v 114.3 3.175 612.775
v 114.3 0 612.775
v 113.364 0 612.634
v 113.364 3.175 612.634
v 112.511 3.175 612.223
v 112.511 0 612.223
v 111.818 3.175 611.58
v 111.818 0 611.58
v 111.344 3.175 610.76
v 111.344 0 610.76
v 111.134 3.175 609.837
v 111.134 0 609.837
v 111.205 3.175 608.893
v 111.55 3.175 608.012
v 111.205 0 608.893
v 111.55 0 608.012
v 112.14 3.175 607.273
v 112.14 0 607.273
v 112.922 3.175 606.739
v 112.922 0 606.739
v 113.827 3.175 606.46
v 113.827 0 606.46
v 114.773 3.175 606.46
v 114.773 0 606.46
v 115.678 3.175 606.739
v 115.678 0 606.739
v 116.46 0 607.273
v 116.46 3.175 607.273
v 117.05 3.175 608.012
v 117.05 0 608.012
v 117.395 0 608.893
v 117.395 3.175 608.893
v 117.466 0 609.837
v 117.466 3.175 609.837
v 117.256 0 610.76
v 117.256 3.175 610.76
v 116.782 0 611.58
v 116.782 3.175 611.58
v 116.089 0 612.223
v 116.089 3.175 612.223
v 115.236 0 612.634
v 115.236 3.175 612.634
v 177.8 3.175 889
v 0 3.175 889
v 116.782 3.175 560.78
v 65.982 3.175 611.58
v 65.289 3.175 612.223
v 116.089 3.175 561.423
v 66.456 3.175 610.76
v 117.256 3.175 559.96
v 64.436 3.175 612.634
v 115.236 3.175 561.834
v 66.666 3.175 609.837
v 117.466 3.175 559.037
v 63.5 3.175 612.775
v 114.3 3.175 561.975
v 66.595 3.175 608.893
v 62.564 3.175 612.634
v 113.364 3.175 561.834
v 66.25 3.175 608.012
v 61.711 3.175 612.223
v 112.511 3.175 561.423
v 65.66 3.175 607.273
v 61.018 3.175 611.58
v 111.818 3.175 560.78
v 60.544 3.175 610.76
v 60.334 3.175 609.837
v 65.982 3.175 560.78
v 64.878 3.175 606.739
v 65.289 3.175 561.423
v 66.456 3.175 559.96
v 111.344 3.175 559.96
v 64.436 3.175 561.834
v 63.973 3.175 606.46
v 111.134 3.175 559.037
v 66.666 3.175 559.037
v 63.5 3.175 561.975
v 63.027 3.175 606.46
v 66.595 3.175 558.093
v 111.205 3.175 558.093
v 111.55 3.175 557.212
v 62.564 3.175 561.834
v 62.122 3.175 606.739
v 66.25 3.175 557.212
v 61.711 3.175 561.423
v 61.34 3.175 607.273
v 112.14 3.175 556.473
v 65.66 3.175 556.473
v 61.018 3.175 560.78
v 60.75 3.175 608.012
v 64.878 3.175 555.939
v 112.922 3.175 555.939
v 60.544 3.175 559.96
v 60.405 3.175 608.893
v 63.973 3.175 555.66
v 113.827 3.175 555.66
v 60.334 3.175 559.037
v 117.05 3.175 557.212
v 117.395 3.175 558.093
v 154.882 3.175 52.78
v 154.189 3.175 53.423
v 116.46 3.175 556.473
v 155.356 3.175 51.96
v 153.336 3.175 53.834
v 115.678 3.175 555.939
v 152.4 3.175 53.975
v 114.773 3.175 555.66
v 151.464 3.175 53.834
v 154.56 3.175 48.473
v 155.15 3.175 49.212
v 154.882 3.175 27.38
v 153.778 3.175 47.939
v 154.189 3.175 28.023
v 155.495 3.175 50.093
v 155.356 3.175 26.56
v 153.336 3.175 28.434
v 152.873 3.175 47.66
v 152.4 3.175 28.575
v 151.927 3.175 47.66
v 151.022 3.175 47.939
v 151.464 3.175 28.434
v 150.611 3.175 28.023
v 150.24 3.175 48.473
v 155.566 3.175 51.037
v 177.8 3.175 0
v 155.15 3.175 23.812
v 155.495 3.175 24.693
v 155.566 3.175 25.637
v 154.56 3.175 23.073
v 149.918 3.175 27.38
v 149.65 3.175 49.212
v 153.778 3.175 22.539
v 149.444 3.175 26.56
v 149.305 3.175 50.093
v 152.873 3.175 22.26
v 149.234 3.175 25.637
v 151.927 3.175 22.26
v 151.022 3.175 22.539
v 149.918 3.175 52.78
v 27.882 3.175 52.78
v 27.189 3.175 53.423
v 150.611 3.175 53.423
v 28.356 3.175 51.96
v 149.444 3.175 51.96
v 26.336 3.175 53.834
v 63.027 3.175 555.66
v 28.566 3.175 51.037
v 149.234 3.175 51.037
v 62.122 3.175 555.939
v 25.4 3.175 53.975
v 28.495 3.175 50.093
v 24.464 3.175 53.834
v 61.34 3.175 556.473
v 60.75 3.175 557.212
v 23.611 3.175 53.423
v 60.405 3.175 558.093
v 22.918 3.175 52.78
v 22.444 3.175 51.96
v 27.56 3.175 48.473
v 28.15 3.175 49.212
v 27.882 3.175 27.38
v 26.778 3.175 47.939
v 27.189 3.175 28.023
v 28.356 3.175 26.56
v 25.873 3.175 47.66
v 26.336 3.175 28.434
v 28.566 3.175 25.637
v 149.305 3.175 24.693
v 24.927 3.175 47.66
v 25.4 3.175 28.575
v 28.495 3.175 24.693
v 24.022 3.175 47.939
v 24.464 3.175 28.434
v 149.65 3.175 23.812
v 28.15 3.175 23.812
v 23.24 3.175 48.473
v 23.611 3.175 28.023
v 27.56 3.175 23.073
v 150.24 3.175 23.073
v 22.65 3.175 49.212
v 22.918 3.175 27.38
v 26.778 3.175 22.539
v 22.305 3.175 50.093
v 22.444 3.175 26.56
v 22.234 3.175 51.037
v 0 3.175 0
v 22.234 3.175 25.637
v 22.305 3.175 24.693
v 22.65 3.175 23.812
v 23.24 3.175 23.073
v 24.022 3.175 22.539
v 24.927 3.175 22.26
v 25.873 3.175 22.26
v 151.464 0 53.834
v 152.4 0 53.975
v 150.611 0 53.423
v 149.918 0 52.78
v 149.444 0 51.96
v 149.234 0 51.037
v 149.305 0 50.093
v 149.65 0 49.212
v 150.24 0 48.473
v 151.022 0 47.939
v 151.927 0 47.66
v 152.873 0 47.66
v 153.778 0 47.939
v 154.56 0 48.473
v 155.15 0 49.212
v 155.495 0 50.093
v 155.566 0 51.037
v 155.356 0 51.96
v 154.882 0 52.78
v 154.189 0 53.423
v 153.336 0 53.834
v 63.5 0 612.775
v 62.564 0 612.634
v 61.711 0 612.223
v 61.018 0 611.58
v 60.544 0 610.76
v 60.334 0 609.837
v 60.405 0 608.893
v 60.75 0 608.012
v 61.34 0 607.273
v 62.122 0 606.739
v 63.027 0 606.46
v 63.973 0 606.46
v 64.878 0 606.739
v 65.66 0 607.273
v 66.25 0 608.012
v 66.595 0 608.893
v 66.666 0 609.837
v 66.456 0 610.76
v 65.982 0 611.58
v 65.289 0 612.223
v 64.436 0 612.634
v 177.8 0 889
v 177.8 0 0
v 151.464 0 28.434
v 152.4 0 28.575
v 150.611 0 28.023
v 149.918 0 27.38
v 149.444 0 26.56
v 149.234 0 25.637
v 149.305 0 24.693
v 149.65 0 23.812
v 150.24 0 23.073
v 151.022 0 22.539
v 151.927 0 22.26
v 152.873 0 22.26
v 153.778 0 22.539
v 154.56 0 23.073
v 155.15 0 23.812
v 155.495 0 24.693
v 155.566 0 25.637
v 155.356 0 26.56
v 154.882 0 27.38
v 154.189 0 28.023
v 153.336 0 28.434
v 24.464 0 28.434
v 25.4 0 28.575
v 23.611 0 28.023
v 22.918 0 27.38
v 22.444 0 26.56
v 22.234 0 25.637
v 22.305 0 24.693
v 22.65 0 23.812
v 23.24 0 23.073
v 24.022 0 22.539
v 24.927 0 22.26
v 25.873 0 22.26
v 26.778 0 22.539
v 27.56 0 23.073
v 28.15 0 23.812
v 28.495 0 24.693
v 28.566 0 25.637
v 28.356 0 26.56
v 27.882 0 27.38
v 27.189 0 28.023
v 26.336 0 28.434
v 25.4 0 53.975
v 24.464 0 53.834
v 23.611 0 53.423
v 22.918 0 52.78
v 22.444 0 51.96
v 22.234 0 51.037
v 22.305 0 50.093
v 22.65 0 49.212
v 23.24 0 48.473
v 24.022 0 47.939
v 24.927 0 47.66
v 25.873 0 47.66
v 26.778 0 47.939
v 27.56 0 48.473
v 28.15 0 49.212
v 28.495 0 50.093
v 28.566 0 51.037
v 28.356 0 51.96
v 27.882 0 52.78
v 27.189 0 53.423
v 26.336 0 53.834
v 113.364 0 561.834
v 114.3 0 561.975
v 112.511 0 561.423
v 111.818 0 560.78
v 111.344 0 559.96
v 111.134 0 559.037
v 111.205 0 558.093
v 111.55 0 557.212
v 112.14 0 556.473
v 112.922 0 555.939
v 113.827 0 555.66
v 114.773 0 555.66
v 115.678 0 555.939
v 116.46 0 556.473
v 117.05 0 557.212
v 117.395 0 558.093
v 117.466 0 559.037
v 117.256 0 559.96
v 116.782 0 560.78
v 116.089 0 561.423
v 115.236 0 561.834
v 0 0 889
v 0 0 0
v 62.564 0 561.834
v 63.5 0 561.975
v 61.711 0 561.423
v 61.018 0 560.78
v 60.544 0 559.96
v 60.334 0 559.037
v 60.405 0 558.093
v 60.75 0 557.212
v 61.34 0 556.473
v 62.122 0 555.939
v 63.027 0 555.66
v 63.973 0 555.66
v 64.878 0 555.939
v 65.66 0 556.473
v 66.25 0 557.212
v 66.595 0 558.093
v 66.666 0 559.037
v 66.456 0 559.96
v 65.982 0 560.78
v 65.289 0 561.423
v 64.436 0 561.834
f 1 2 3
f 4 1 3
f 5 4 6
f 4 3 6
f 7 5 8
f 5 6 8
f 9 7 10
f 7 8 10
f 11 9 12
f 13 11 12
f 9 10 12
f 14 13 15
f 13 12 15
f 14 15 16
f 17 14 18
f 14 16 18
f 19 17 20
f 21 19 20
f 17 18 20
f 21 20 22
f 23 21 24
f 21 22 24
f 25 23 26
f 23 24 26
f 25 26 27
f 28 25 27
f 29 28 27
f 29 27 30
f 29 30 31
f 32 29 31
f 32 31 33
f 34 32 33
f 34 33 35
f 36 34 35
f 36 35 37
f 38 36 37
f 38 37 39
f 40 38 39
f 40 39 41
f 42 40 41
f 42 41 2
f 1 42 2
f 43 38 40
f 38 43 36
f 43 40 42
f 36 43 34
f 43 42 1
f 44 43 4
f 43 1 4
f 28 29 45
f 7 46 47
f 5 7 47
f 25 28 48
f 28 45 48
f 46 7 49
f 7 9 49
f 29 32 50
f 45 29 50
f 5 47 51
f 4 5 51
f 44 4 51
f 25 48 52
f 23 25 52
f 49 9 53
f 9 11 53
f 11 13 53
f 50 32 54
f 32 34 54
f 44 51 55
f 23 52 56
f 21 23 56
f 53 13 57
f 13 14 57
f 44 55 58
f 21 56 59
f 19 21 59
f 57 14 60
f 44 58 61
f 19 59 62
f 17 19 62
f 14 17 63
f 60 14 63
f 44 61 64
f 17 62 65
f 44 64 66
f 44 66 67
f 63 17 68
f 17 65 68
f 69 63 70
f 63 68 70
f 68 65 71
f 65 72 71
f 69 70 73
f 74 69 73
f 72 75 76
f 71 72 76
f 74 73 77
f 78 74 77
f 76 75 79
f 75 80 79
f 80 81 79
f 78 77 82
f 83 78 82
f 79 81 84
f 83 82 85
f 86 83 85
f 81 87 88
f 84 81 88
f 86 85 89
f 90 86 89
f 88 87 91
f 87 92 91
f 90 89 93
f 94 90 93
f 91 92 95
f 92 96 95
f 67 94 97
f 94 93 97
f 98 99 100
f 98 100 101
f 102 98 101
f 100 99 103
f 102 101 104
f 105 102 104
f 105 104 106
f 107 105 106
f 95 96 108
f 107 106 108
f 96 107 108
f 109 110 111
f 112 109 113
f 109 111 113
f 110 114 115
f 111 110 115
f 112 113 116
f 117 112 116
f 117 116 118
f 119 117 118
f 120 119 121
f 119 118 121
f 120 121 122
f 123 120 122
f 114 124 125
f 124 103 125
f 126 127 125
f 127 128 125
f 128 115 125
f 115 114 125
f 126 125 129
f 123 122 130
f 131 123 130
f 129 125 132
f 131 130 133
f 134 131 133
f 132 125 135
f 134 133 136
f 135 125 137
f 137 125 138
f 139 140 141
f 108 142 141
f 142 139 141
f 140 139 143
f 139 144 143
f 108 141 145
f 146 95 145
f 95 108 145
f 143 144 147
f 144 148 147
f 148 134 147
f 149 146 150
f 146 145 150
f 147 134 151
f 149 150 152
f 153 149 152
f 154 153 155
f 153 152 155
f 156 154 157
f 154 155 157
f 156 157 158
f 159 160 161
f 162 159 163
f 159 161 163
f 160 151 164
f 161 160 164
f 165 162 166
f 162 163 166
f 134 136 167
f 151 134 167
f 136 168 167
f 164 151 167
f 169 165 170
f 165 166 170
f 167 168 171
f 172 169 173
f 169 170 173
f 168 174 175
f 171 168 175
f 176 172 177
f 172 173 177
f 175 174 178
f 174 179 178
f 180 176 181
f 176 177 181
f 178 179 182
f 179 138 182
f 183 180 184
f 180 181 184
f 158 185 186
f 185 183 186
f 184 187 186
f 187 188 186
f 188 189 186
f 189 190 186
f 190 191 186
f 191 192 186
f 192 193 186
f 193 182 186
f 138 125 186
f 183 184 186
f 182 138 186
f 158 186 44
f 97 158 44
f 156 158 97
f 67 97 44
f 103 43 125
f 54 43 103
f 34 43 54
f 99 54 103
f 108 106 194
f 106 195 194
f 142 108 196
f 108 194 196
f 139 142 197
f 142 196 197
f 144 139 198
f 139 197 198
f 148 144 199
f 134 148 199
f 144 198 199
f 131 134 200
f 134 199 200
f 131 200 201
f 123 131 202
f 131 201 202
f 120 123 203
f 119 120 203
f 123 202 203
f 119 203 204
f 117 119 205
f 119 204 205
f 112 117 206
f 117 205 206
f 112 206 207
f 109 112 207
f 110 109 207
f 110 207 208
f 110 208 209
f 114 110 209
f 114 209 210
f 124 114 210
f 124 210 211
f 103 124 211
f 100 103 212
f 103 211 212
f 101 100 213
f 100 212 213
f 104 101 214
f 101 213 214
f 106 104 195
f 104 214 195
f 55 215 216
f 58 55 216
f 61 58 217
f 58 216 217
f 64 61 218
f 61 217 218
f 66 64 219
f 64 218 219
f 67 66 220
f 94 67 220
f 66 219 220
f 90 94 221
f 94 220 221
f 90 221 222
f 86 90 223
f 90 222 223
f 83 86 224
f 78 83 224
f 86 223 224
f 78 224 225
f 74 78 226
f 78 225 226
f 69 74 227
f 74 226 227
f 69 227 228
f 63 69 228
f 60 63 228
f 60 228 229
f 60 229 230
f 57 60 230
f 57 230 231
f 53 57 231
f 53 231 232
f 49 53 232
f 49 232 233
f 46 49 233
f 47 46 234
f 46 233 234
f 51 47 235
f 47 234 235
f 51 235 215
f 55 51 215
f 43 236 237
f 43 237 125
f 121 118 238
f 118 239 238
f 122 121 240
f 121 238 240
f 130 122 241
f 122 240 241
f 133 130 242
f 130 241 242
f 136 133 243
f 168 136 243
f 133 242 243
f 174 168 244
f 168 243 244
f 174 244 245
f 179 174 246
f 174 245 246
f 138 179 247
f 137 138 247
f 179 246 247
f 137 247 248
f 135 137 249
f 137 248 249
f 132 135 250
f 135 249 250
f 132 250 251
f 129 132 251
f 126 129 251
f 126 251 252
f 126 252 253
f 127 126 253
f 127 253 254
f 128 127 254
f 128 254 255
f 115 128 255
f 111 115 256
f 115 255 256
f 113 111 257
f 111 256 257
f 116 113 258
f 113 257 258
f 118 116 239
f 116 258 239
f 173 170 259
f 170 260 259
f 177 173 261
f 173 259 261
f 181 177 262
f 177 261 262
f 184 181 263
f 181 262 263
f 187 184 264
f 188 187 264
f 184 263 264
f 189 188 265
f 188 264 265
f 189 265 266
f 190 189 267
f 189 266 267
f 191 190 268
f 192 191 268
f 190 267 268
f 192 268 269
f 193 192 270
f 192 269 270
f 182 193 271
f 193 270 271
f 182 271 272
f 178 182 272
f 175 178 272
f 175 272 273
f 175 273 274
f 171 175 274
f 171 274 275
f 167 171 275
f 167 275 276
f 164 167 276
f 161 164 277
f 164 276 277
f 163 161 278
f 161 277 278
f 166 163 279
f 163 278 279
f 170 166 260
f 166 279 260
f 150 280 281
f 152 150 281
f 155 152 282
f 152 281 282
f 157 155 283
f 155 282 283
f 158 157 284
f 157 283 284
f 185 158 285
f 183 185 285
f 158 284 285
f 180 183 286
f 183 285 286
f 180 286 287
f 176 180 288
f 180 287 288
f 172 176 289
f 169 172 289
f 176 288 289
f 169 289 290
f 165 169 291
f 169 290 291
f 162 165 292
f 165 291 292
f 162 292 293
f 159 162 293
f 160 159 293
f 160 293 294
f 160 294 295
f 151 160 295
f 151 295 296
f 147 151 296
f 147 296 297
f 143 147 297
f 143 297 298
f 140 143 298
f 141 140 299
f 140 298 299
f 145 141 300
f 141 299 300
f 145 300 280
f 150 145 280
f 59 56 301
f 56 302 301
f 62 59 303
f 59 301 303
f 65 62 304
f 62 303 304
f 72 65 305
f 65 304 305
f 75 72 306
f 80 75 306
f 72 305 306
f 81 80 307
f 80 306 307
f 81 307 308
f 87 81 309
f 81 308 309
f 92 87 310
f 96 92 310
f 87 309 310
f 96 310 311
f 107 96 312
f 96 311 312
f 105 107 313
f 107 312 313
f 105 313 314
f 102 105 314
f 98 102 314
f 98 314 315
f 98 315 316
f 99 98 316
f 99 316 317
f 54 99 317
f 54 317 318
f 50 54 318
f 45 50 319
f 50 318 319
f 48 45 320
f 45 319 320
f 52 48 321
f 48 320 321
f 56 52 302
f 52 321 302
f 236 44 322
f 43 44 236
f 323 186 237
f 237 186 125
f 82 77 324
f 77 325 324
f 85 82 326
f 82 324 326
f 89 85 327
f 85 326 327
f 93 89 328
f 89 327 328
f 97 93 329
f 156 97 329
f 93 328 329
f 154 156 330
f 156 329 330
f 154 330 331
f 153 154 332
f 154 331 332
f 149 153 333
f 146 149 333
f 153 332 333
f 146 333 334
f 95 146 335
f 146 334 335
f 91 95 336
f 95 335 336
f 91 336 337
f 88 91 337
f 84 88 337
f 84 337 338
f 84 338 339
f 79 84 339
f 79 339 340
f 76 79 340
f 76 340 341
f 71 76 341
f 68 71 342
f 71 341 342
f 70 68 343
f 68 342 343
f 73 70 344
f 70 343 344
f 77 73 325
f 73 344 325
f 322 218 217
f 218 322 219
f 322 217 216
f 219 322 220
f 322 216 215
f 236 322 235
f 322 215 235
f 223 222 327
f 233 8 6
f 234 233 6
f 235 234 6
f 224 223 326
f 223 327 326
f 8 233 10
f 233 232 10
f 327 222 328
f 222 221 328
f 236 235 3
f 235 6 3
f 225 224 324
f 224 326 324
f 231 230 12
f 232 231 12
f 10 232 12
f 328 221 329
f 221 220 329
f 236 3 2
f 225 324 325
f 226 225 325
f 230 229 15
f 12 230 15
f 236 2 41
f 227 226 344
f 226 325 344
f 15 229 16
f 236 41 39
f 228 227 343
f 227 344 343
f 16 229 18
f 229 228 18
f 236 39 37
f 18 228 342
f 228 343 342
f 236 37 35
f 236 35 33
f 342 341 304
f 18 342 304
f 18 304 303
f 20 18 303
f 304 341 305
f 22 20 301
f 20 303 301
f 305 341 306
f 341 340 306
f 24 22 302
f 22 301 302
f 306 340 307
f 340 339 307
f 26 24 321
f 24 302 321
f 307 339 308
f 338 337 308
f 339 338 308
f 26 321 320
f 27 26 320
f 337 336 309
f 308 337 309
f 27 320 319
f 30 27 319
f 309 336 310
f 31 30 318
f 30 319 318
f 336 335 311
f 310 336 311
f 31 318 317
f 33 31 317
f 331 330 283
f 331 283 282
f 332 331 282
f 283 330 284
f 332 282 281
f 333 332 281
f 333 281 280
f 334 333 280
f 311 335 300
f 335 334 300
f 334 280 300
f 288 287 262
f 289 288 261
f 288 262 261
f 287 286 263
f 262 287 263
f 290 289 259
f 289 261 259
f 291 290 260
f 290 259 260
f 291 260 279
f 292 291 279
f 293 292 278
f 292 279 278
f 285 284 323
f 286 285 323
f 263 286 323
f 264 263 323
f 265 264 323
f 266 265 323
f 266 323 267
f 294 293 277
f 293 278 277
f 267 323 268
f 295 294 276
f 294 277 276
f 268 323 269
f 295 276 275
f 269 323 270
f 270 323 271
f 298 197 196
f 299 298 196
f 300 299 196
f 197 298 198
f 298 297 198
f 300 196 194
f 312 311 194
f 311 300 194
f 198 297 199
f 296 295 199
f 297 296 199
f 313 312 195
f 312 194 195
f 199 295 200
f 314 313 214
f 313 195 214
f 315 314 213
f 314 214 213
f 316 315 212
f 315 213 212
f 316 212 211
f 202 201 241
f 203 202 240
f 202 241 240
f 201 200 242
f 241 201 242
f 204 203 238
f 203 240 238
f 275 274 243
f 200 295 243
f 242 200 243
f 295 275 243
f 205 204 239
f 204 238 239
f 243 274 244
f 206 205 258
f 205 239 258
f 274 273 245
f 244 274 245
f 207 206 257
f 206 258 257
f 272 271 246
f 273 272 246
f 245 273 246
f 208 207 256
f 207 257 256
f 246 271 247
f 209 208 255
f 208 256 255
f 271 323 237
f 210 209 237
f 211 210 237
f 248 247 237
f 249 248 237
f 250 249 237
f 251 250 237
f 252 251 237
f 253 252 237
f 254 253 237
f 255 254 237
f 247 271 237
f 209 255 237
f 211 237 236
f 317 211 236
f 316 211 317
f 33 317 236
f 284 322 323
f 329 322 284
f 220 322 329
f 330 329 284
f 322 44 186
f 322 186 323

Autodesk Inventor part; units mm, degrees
ref_plane "YZ Plane" through (0, 0, 0) normal (1, 0, 0) x (0, 1, 0)
ref_plane "XZ Plane" through (0, 0, 0) normal (0, 1, 0) x (-1, 0, 0)
ref_plane "XY Plane" through (0, 0, 0) normal (0, 0, 1) x (1, 0, 0)
sketch "Sketch1" plane through (0, 0, 0) normal (0, 0, 1) x (1, 0, 0)
  point P0 (0, 0)
sketch "Sketch2" plane through (0, 0, 0) normal (0, 0, 1) x (1, 0, 0)
  line L0 (0, 0) -> (177.8, 0)
  line L1 (177.8, 0) -> (177.8, 3.175)
  line L2 (177.8, 3.175) -> (0, 3.175)
  line L3 (0, 3.175) -> (0, 0)
  dimension "d0" = 177.8
  dimension "d1" = 3.175
extrude "Extrusion1" add sketch "Sketch2" along normal blind 889
sketch "Sketch3" plane through (0, 3.175, 0) normal (0, 1, 0) x (1, 0, 0)
  line L0 (177.8, 0) -> (0, 0) projected
  line L1 (177.8, 0) -> (177.8, -889) projected
  line L2 (0, 0) -> (0, -889) projected
  point P0 (63.5, -558.8)
  point P1 (114.3, -558.8)
  point P2 (63.5, -609.6)
  point P3 (114.3, -609.6)
  dimension "d4" = 558.8
  dimension "d5" = 558.8
  dimension "d6" = 609.6
  dimension "d7" = 609.6
  dimension "d8" = 63.5
  dimension "d9" = 63.5
  dimension "d10" = 63.5
  dimension "d11" = 63.5
hole "Hole1" at (63.5, 3.175, 558.8) at (63.5, 3.175, 609.6) at (114.3, 3.175, 609.6) at (114.3, 3.175, 558.8) direction (0, -1, 0) diameter 6.35 end through all
sketch "Sketch4" plane through (0, 3.175, 0) normal (0, 1, 0) x (1, 0, 0)
  line L0 (177.8, 0) -> (0, 0) projected
  line L1 (0, 0) -> (0, -889) projected
  line L2 (177.8, 0) -> (177.8, -889) projected
  point P0 (25.4, -25.4)
  point P1 (25.4, -50.8)
  point P2 (152.4, -25.4)
  point P3 (152.4, -50.8)
  dimension "d19" = 25.4
  dimension "d20" = 25.4
  dimension "d21" = 25.4
  dimension "d22" = 25.4
  dimension "d23" = 25.4
  dimension "d24" = 25.4
  dimension "d25" = 50.8
  dimension "d26" = 50.8
hole "Hole2" at (25.4, 3.175, 25.4) at (25.4, 3.175, 50.8) at (152.4, 3.175, 50.8) at (152.4, 3.175, 25.4) direction (0, -1, 0) diameter 6.35 end through all
properties part number "Undercarriage Panel"
